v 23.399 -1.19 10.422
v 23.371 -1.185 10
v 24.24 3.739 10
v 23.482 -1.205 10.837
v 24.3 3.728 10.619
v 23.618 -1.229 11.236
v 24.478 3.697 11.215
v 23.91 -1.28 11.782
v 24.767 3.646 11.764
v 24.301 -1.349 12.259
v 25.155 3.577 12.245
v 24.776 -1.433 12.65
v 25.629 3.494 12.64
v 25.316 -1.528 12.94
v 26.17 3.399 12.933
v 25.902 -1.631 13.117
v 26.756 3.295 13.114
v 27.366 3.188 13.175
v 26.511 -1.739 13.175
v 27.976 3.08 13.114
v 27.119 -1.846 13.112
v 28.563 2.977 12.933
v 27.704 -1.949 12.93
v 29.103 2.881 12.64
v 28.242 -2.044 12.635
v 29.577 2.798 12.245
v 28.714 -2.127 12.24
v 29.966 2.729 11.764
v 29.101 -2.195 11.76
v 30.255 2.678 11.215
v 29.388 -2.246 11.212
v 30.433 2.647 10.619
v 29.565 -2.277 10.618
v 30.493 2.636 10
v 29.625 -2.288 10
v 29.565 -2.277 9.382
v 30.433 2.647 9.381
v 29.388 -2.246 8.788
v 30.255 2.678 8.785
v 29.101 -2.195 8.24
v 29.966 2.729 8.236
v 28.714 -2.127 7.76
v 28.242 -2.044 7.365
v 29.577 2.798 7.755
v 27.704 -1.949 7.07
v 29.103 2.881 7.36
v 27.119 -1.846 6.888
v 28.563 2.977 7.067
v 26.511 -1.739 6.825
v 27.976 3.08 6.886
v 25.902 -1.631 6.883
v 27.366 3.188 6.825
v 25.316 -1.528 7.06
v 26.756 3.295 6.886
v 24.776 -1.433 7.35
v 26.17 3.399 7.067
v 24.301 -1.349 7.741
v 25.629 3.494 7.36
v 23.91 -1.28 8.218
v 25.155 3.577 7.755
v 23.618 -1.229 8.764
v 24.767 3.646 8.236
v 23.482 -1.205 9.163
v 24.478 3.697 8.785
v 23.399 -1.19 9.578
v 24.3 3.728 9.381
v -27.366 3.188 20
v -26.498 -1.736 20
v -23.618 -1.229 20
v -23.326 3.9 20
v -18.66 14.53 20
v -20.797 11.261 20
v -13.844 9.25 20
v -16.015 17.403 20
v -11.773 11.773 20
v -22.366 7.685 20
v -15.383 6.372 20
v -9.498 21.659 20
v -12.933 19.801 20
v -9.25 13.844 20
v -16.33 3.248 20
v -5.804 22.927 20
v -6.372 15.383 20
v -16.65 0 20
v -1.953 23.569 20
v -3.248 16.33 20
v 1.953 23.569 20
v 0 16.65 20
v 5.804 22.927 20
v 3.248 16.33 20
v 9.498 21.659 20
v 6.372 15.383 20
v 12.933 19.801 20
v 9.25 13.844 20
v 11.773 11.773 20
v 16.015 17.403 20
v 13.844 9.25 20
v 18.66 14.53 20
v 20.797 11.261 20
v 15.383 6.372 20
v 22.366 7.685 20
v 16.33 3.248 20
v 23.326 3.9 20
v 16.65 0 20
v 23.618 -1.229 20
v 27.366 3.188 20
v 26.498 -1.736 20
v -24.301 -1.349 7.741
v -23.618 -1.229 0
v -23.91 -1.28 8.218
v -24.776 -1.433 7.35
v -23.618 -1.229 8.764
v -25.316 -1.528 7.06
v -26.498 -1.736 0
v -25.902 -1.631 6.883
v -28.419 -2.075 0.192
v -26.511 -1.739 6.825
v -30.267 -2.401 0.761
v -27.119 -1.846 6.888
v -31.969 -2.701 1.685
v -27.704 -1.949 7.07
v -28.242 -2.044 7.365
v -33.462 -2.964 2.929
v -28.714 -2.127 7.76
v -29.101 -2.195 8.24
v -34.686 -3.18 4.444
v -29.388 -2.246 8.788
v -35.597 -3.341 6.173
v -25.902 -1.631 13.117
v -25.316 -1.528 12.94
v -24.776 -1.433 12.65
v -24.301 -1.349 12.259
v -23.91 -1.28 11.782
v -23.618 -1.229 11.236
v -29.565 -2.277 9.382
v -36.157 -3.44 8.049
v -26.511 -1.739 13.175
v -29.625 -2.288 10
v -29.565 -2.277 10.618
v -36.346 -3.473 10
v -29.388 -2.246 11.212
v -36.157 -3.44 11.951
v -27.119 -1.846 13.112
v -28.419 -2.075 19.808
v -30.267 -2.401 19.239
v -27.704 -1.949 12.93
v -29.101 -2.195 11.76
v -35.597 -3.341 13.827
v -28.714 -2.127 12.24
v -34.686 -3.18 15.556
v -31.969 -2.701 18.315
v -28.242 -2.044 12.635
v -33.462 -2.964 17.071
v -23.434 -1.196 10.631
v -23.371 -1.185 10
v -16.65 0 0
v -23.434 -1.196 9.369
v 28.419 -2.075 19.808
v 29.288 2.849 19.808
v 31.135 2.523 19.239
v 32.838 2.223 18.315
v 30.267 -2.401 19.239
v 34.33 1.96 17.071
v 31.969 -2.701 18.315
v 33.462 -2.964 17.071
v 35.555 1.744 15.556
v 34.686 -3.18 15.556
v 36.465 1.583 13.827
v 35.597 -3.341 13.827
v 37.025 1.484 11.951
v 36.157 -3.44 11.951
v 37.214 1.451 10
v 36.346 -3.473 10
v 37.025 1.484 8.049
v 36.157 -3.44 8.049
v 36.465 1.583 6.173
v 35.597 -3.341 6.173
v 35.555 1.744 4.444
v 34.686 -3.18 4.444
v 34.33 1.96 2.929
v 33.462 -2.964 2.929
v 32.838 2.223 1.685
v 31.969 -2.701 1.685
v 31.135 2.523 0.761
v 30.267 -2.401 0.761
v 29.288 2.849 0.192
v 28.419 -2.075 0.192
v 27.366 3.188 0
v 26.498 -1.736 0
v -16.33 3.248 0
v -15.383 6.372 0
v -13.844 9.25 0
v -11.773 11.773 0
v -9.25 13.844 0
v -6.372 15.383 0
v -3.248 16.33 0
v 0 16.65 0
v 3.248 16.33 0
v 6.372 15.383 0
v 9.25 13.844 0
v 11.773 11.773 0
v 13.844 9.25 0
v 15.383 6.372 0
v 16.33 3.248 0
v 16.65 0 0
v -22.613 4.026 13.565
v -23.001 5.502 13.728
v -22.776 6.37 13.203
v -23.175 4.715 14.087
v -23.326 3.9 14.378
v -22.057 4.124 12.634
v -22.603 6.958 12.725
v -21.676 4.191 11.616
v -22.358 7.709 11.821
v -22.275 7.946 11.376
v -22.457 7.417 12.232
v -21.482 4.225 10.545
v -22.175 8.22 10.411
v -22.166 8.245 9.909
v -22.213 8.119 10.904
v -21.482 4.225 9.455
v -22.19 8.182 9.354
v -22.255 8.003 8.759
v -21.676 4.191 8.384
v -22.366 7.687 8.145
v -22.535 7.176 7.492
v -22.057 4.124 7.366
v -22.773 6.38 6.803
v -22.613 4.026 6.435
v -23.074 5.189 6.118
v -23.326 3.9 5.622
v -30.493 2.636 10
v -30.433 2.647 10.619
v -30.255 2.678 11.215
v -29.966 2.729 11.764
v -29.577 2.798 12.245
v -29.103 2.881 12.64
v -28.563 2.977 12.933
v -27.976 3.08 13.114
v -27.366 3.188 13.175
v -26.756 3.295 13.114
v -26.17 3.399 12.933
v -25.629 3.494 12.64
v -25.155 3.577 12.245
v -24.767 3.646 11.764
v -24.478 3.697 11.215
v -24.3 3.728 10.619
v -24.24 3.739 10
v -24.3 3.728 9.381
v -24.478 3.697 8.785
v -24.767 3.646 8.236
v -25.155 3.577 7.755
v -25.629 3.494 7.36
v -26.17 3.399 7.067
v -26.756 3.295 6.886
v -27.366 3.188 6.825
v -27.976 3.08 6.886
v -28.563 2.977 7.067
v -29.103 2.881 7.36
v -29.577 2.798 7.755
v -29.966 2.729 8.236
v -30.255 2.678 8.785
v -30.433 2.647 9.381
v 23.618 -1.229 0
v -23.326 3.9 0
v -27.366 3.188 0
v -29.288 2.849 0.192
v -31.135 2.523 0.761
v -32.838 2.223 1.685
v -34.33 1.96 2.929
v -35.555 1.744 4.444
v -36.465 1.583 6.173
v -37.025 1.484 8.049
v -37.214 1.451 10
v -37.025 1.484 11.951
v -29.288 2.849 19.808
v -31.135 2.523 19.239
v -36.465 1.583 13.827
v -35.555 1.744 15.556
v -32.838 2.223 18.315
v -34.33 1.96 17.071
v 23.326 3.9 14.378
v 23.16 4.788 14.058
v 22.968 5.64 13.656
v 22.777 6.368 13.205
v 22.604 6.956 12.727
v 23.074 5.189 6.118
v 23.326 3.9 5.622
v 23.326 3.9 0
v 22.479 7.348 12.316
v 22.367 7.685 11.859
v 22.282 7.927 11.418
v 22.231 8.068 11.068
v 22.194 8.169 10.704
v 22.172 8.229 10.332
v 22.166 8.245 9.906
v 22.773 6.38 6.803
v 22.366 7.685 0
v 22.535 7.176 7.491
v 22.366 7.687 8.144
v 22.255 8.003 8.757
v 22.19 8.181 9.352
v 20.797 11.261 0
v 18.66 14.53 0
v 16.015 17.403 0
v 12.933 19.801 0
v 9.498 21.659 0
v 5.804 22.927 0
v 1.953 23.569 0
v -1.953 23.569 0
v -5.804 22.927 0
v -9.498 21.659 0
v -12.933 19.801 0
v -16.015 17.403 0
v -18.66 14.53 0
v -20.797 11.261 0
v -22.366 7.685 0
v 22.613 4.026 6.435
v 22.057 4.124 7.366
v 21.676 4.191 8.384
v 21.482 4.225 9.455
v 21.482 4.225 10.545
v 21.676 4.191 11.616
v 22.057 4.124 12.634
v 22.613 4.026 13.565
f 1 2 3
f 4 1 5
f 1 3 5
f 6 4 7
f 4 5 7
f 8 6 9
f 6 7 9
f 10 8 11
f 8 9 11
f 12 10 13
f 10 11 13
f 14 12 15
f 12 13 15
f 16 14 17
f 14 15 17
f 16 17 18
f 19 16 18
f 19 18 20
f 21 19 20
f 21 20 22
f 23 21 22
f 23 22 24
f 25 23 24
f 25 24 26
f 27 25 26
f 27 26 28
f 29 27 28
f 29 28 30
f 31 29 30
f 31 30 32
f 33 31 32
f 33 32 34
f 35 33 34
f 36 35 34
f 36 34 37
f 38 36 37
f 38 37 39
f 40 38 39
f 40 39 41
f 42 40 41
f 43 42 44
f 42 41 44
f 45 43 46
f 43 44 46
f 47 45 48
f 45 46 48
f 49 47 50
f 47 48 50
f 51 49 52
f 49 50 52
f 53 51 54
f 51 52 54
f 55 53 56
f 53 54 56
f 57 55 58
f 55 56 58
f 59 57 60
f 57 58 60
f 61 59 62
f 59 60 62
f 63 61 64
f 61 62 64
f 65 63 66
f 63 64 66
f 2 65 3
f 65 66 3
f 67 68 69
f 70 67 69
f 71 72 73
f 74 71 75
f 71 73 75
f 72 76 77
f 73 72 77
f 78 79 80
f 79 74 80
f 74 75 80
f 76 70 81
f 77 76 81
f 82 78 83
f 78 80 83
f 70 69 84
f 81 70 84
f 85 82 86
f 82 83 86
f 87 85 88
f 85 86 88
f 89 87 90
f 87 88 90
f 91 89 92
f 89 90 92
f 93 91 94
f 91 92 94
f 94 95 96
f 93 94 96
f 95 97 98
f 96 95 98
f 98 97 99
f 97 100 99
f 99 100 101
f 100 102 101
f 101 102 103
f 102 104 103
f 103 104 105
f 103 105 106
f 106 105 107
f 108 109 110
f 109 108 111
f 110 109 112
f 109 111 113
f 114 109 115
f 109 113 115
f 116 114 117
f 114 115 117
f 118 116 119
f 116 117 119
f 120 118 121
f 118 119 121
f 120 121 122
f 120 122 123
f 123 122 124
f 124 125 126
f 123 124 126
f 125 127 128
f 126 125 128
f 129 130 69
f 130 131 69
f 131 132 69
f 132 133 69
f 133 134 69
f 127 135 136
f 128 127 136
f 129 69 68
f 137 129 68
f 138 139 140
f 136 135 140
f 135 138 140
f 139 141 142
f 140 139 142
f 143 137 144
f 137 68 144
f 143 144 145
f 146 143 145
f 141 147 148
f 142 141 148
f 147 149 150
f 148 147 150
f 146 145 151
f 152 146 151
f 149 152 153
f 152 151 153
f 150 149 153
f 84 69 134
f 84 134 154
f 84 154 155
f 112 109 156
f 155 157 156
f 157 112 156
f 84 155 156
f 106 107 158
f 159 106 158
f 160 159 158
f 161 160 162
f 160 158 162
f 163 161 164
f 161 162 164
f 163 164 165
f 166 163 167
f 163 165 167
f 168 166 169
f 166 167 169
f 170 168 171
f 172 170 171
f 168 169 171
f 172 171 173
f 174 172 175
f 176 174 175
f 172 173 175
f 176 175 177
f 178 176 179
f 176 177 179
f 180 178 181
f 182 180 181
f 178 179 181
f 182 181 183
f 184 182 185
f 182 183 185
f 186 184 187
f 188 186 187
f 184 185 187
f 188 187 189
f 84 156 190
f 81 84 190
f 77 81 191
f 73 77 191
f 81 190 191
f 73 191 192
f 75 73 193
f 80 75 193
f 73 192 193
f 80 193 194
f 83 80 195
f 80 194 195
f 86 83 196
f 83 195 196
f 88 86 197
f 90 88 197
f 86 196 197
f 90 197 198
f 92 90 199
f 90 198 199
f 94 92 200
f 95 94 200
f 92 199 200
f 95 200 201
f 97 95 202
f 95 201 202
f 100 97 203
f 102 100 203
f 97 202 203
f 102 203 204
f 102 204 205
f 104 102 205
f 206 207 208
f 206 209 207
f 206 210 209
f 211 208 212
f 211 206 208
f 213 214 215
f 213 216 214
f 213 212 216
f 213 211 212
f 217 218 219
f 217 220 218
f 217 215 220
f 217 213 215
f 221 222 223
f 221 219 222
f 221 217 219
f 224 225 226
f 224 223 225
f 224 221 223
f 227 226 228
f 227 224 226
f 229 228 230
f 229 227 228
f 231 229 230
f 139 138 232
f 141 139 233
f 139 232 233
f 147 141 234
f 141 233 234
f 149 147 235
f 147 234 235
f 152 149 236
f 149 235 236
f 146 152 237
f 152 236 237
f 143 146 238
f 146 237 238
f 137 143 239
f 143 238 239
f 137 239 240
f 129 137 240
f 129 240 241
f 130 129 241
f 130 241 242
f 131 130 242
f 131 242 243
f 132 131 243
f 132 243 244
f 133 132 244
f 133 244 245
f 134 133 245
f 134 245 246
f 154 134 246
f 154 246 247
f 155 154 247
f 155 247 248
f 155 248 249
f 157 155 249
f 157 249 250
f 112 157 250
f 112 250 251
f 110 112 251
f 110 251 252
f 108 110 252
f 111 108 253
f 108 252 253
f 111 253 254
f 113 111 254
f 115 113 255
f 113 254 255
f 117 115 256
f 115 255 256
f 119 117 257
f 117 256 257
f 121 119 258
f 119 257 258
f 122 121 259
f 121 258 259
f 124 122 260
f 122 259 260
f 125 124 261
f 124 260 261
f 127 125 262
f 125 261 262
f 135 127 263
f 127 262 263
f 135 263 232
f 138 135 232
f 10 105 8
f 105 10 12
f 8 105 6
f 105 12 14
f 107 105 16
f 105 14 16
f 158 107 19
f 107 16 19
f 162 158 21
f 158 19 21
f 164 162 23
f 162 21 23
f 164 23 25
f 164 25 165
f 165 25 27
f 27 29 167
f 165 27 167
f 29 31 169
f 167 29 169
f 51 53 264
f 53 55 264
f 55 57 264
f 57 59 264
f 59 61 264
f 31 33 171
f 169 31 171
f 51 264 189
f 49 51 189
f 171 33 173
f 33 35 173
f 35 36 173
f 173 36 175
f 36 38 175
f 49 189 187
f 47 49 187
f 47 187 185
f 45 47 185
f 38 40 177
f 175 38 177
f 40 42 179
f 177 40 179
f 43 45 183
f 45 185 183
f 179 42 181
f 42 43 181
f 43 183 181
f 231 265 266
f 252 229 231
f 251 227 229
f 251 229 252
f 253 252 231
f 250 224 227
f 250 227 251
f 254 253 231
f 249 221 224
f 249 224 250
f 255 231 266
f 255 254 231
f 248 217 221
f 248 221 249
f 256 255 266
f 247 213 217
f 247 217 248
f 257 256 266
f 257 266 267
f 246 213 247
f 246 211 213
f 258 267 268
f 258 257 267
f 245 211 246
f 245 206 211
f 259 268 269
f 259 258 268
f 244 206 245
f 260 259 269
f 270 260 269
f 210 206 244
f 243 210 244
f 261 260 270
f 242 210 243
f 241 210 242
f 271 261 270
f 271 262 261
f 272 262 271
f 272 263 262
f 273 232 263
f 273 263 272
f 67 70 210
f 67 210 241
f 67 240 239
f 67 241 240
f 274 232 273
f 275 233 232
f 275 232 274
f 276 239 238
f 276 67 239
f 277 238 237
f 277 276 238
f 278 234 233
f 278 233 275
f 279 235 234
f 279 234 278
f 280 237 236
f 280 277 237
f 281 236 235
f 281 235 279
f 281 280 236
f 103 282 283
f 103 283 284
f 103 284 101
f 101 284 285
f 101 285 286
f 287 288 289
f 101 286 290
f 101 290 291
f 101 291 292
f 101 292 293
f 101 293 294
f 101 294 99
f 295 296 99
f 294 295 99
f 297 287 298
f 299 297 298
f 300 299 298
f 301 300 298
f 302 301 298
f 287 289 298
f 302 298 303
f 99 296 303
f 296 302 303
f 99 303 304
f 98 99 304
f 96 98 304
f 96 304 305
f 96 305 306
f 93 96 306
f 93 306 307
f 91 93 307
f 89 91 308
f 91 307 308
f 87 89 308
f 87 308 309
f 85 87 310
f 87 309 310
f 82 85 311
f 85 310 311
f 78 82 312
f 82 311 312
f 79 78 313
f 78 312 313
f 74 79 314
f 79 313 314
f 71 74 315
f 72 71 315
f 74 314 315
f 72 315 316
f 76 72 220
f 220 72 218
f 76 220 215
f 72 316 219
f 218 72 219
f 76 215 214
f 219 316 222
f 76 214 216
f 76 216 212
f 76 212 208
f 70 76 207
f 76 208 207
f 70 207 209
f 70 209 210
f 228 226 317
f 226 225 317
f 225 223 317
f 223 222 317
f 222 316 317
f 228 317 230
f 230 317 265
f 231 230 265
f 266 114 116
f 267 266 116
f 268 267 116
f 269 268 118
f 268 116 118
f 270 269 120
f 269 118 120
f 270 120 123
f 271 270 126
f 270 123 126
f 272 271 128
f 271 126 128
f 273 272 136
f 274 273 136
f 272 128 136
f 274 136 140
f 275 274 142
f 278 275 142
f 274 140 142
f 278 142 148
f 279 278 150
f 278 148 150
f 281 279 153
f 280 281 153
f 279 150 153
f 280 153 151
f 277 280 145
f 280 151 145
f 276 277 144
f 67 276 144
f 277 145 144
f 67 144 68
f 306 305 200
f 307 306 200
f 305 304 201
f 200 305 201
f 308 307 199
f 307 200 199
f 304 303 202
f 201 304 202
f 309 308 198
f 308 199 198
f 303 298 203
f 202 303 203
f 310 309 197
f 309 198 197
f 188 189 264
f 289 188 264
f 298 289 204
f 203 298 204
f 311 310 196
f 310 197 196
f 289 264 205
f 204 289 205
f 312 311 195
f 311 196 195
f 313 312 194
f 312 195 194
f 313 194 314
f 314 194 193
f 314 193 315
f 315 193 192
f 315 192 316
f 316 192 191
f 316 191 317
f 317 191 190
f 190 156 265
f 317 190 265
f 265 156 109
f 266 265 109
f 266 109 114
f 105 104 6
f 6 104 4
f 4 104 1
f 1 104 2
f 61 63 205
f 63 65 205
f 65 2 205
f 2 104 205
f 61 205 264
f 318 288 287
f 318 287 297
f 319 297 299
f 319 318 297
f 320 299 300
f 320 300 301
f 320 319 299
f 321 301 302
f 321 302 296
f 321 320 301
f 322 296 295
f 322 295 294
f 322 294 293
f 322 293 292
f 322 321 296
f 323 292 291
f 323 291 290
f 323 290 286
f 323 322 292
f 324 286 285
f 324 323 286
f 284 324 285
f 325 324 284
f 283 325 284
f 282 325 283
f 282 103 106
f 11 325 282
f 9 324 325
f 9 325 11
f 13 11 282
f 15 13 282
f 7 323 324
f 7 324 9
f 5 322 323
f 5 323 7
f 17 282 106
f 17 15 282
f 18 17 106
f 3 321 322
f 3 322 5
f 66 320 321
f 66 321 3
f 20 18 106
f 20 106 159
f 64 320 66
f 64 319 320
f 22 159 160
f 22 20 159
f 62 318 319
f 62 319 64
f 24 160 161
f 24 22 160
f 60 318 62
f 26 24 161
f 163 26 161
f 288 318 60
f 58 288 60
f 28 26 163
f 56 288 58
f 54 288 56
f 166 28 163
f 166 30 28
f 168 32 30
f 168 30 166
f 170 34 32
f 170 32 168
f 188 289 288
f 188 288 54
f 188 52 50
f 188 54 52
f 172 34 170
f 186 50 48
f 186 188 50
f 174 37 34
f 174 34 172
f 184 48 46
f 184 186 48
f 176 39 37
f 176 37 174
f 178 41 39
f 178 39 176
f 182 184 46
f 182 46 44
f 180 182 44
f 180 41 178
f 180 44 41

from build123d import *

# Parameters (mm, degrees)
BOSS_EXTRUDE1_DEPTH = 20
BOSS_EXTRUDE2_DEPTH = 5
BOSS_EXTRUDE4_DEPTH = 5
SKETCH8_R           = 3.175
CUT_EXTRUDE2_DEPTH  = 47.2699694
SKETCH9_R           = 6
CUT_EXTRUDE3_DEPTH  = 5
SKETCH10_R          = 3.175
CUT_EXTRUDE4_DEPTH  = 47.269969478
SKETCH11_R          = 6
CUT_EXTRUDE5_DEPTH  = 5


with BuildPart() as part:
    # Sketch1 → Boss-Extrude1 (new body)
    with BuildSketch(Plane.XY):
        with BuildLine():
            Line((16.65, 0), (23.618063018, -1.228657513))
            ThreePointArc((23.618063018, -1.228657513), (0, 23.65), (-23.618063018, -1.228657513))
            Line((-23.618063018, -1.228657513), (-16.65, 0))
            ThreePointArc((-16.65, 0), (0, 16.65), (16.65, 0))
        make_face()
    extrude(amount=BOSS_EXTRUDE1_DEPTH)

    # Sketch2 → Boss-Extrude2 (add)
    with BuildSketch(Plane(origin=(0.502058932, 2.847317693, 0), x_dir=(-0.9848077530122079, 0.1736481776669312, 0), z_dir=(-0.1736481776669312, -0.9848077530122079, 0))):
        with BuildLine():
            Line((-26.397049088, 0), (-16.397049088, 0))
            Line((-16.397049088, 0), (-16.397049088, -20))
            Line((-16.397049088, -20), (-26.397049088, -20))
            ThreePointArc((-26.397049088, -20), (-36.397049088, -10), (-26.397049088, 0))
        make_face()
    extrude(amount=-BOSS_EXTRUDE2_DEPTH)

    # Sketch6 → Boss-Extrude4 (add)
    with BuildSketch(Plane(origin=(-0.502058932, 2.847317693, 0), x_dir=(0.9848077530122087, 0.173648177666927, 0), z_dir=(0.173648177666927, -0.9848077530122087, 0))):
        with BuildLine():
            Line((-26.397049088, 20), (-16.397049088, 20))
            Line((-16.397049088, 20), (-16.397049088, 0))
            Line((-16.397049088, 0), (-26.397049088, 0))
            ThreePointArc((-26.397049088, 0), (-36.397049088, 10), (-26.397049088, 20))
        make_face()
    extrude(amount=-BOSS_EXTRUDE4_DEPTH)

    # Sketch8 → Cut-Extrude2 (cut, through all)
    with BuildSketch(Plane(origin=(-1.37029982, 7.771356458, 0), x_dir=(0.9848077530122087, 0.173648177666927, 0), z_dir=(-0.173648177666927, 0.9848077530122087, 0))):
        with Locations(Location((-26.397049088, -10, 0), (0, 0, 180))):
            Circle(SKETCH8_R)
    extrude(amount=-CUT_EXTRUDE2_DEPTH, mode=Mode.SUBTRACT)

    # Sketch9 → Cut-Extrude3 (cut)
    with BuildSketch(Plane(origin=(-1.37029982, 7.771356458, 0), x_dir=(0.9848077530122087, 0.173648177666927, 0), z_dir=(-0.173648177666927, 0.9848077530122087, 0))):
        with Locations((-26.397049088, -10)):
            Circle(SKETCH9_R)
    extrude(amount=CUT_EXTRUDE3_DEPTH, mode=Mode.SUBTRACT)

    # Sketch10 → Cut-Extrude4 (cut, through all)
    with BuildSketch(Plane(origin=(1.37029982, 7.771356458, 0), x_dir=(0.9848077530122079, -0.1736481776669312, 0), z_dir=(0.1736481776669312, 0.9848077530122079, 0))):
        with Locations(Location((26.397049088, -10, 0), (0, 0, 180))):
            Circle(SKETCH10_R)
    extrude(amount=-CUT_EXTRUDE4_DEPTH, mode=Mode.SUBTRACT)

    # Sketch11 → Cut-Extrude5 (cut)
    with BuildSketch(Plane(origin=(1.37029982, 7.771356458, 0), x_dir=(0.9848077530122079, -0.1736481776669312, 0), z_dir=(0.1736481776669312, 0.9848077530122079, 0))):
        with Locations((26.397049088, -10)):
            Circle(SKETCH11_R)
    extrude(amount=CUT_EXTRUDE5_DEPTH, mode=Mode.SUBTRACT)


solid = part.part
